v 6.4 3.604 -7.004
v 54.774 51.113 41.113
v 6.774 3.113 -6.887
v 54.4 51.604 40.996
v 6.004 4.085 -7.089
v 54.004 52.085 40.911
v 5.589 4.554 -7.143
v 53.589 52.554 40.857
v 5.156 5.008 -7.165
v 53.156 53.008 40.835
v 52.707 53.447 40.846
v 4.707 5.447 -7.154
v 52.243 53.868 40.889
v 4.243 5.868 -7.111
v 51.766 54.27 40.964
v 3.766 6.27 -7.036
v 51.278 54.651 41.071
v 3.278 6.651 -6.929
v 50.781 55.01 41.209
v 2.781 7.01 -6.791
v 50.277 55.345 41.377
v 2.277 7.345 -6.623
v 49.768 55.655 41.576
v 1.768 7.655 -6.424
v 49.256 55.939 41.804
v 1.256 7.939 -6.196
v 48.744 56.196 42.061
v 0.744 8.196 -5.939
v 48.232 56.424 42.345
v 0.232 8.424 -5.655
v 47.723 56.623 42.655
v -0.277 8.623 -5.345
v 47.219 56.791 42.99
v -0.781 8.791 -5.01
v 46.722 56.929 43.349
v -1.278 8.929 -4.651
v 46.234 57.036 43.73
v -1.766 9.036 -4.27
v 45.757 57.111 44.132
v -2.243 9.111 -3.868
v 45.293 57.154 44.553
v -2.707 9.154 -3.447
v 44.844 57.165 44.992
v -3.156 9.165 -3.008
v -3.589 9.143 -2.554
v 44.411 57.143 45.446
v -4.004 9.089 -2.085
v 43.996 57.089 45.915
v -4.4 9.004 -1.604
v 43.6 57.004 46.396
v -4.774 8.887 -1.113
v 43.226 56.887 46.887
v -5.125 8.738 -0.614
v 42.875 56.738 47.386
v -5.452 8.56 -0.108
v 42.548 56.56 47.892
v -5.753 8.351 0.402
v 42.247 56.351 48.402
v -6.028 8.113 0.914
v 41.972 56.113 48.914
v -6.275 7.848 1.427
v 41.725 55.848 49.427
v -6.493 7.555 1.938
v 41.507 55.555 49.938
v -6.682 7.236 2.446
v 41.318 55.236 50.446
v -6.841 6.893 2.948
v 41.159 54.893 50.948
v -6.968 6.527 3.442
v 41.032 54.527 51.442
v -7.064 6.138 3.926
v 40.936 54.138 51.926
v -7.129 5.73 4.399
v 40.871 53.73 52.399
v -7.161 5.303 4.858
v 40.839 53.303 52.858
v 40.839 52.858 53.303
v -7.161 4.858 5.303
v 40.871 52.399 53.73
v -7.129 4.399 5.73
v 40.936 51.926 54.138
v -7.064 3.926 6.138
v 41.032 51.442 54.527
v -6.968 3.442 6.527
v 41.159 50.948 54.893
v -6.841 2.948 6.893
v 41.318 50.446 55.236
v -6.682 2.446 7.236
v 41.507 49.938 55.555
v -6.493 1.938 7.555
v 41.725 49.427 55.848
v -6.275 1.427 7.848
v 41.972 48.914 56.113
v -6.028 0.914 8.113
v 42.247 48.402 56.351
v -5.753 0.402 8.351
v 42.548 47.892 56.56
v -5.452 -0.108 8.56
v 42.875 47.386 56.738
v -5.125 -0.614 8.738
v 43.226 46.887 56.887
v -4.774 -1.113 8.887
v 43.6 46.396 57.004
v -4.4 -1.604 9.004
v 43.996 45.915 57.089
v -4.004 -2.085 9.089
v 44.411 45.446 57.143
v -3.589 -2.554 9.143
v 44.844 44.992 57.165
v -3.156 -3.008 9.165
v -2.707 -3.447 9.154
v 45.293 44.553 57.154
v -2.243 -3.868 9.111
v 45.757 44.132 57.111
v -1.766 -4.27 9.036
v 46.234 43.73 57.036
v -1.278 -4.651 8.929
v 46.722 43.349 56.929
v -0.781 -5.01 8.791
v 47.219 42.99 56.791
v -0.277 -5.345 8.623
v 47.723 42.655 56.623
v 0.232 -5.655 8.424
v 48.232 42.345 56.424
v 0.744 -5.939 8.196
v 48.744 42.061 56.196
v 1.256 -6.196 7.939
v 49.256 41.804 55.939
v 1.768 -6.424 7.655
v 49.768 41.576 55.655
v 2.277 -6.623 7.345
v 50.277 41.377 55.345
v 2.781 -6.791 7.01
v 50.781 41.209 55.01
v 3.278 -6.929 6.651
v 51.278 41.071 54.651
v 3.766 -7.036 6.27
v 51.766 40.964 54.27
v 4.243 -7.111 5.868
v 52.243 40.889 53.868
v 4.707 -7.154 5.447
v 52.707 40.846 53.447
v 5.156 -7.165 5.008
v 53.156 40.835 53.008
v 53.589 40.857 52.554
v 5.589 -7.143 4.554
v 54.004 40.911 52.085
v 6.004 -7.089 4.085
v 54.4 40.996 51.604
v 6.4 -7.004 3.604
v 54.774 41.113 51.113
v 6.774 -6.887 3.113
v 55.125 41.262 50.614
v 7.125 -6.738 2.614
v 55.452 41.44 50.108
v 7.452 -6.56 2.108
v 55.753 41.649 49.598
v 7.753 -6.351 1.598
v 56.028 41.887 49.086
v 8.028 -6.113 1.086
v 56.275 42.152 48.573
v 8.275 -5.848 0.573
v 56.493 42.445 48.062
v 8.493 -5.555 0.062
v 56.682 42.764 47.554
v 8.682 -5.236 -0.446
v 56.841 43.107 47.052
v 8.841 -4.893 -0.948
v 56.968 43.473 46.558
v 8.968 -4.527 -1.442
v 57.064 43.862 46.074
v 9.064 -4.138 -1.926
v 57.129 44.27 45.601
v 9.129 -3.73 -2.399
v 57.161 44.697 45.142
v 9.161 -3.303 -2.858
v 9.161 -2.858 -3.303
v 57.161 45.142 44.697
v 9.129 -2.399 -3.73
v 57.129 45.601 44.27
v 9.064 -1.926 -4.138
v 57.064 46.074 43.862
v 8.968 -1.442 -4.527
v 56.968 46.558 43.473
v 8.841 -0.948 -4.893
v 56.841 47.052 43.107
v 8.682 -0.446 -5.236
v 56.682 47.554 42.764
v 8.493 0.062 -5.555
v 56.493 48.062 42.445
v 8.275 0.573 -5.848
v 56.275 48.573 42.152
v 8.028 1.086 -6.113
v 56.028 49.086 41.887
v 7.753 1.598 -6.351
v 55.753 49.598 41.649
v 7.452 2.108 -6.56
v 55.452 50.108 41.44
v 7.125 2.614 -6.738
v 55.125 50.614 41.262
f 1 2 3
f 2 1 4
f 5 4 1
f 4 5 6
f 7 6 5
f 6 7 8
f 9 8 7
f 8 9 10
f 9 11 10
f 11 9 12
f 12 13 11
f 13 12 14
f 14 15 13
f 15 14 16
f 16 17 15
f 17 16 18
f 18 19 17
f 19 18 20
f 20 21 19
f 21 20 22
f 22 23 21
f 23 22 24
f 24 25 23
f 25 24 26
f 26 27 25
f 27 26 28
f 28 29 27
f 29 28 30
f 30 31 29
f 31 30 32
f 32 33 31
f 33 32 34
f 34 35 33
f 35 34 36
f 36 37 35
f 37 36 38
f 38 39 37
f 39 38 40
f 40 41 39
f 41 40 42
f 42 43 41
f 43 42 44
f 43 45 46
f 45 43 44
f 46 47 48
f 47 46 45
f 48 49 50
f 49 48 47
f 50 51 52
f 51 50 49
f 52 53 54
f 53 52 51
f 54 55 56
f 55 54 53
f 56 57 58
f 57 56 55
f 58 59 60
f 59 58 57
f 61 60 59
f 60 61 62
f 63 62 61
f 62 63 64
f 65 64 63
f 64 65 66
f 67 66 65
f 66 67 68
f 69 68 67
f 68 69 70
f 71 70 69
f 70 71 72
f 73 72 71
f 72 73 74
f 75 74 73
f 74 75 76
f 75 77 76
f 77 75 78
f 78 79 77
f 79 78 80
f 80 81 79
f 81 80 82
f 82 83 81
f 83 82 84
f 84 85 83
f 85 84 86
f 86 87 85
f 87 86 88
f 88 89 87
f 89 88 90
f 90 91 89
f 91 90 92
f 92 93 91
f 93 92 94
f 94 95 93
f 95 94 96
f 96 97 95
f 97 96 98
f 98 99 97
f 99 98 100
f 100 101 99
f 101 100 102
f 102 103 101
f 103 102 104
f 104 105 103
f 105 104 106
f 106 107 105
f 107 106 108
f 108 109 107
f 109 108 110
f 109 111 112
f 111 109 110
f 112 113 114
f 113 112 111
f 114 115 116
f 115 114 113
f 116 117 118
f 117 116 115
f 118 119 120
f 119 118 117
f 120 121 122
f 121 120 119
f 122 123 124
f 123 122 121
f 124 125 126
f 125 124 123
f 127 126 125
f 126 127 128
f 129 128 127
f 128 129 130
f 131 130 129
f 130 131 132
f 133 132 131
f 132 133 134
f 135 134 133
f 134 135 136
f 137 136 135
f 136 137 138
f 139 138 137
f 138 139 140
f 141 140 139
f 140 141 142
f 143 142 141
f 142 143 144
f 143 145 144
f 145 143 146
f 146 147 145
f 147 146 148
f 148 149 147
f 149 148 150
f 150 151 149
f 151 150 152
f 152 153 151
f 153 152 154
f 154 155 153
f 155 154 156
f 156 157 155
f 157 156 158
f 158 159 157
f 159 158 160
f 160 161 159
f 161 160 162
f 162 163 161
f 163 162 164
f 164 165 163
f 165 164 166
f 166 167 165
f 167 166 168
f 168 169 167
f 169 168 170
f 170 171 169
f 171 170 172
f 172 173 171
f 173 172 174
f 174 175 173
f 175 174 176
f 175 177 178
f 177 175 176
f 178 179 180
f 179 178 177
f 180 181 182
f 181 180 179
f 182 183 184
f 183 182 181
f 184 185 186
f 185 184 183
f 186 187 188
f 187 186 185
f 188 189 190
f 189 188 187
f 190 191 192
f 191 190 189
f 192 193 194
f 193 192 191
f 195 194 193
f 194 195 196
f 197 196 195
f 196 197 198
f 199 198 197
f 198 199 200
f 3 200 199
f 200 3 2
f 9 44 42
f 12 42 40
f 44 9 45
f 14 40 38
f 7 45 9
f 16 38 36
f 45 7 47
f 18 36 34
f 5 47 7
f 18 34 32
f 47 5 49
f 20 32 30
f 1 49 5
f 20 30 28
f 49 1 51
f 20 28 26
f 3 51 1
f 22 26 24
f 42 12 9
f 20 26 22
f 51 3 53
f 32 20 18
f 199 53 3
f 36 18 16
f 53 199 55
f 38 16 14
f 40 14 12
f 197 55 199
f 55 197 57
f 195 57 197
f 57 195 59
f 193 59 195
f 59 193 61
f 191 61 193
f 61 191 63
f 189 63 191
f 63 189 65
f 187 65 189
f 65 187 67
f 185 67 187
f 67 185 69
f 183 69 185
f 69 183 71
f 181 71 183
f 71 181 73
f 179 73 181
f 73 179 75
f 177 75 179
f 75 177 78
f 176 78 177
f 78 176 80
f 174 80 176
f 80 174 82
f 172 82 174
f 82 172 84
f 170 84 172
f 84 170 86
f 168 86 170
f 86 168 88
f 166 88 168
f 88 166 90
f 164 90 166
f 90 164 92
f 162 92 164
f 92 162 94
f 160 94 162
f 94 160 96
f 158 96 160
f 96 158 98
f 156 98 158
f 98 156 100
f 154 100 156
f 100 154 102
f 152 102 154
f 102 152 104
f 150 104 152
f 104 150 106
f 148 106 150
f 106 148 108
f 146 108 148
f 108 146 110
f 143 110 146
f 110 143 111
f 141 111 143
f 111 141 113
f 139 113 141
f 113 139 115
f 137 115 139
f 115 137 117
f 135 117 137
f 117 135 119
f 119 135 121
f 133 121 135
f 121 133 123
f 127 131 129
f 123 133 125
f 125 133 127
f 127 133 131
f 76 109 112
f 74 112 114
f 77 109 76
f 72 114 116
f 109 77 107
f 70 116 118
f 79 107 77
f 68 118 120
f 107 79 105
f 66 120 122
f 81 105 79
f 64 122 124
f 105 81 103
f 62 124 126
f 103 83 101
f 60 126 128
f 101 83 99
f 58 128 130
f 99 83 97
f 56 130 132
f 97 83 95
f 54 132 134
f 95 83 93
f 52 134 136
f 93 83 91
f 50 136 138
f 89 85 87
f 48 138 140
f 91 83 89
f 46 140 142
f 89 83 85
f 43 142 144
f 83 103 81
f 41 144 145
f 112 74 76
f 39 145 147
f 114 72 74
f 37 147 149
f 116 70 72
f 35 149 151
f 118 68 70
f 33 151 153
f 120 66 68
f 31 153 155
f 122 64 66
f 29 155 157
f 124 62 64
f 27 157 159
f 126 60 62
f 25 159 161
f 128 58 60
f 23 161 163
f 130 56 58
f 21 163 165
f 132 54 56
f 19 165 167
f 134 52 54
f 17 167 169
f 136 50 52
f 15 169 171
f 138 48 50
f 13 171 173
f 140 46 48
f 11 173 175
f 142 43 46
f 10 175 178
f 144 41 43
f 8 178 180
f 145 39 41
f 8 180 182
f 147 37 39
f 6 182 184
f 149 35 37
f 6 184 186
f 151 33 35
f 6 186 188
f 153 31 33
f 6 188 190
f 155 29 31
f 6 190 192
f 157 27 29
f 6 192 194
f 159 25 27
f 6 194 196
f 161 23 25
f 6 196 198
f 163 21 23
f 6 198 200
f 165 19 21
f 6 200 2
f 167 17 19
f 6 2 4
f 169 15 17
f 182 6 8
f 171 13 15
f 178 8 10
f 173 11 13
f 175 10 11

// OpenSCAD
$fn=100;
mm=1; // define units
degrees=1;

include <../lib.scad>

module point(vec){
  // Move the object so that [0,0,0] is at =vec=, rotating the object
  // along the smallest arch to reach there.
  
  // assert only one child
  // assert not [0,0,0]
  // assert not [-x,0,0]

  angle=acos(vec[0]/
	       sqrt(vec[0]*vec[0]+vec[1]*vec[1]+vec[2]*vec[2]));
  normal=[0,vec[2],-vec[1]];
  
  translate(vec){
    rotate(a=-angle,v=normal){
      children();}}}

module example_134(){
  side=150;
  plane_vec=([1,1,1]/sqrt(3)*[150/2,150/2,150/2-80])*[1,1,1]/sqrt(3);
  echo(plane_vec);
  cut_apothem=20;
  difference(){
    Cube(side,center=true);
    point(plane_vec){
      Cube(side/*overcut*/,center=Y+Z);}
    point(-plane_vec){
      Cube(side/*overcut*/,center=Y+Z);}
    point(plane_vec){
      rotate(90*Y){
	cylinder(r=15,h=side*5/*overcut*/,center=true);}}}}

%example_134();

point([1,1,1])
rotate(90*Y)
cylinder(h=48*sqrt(3),r=10);
